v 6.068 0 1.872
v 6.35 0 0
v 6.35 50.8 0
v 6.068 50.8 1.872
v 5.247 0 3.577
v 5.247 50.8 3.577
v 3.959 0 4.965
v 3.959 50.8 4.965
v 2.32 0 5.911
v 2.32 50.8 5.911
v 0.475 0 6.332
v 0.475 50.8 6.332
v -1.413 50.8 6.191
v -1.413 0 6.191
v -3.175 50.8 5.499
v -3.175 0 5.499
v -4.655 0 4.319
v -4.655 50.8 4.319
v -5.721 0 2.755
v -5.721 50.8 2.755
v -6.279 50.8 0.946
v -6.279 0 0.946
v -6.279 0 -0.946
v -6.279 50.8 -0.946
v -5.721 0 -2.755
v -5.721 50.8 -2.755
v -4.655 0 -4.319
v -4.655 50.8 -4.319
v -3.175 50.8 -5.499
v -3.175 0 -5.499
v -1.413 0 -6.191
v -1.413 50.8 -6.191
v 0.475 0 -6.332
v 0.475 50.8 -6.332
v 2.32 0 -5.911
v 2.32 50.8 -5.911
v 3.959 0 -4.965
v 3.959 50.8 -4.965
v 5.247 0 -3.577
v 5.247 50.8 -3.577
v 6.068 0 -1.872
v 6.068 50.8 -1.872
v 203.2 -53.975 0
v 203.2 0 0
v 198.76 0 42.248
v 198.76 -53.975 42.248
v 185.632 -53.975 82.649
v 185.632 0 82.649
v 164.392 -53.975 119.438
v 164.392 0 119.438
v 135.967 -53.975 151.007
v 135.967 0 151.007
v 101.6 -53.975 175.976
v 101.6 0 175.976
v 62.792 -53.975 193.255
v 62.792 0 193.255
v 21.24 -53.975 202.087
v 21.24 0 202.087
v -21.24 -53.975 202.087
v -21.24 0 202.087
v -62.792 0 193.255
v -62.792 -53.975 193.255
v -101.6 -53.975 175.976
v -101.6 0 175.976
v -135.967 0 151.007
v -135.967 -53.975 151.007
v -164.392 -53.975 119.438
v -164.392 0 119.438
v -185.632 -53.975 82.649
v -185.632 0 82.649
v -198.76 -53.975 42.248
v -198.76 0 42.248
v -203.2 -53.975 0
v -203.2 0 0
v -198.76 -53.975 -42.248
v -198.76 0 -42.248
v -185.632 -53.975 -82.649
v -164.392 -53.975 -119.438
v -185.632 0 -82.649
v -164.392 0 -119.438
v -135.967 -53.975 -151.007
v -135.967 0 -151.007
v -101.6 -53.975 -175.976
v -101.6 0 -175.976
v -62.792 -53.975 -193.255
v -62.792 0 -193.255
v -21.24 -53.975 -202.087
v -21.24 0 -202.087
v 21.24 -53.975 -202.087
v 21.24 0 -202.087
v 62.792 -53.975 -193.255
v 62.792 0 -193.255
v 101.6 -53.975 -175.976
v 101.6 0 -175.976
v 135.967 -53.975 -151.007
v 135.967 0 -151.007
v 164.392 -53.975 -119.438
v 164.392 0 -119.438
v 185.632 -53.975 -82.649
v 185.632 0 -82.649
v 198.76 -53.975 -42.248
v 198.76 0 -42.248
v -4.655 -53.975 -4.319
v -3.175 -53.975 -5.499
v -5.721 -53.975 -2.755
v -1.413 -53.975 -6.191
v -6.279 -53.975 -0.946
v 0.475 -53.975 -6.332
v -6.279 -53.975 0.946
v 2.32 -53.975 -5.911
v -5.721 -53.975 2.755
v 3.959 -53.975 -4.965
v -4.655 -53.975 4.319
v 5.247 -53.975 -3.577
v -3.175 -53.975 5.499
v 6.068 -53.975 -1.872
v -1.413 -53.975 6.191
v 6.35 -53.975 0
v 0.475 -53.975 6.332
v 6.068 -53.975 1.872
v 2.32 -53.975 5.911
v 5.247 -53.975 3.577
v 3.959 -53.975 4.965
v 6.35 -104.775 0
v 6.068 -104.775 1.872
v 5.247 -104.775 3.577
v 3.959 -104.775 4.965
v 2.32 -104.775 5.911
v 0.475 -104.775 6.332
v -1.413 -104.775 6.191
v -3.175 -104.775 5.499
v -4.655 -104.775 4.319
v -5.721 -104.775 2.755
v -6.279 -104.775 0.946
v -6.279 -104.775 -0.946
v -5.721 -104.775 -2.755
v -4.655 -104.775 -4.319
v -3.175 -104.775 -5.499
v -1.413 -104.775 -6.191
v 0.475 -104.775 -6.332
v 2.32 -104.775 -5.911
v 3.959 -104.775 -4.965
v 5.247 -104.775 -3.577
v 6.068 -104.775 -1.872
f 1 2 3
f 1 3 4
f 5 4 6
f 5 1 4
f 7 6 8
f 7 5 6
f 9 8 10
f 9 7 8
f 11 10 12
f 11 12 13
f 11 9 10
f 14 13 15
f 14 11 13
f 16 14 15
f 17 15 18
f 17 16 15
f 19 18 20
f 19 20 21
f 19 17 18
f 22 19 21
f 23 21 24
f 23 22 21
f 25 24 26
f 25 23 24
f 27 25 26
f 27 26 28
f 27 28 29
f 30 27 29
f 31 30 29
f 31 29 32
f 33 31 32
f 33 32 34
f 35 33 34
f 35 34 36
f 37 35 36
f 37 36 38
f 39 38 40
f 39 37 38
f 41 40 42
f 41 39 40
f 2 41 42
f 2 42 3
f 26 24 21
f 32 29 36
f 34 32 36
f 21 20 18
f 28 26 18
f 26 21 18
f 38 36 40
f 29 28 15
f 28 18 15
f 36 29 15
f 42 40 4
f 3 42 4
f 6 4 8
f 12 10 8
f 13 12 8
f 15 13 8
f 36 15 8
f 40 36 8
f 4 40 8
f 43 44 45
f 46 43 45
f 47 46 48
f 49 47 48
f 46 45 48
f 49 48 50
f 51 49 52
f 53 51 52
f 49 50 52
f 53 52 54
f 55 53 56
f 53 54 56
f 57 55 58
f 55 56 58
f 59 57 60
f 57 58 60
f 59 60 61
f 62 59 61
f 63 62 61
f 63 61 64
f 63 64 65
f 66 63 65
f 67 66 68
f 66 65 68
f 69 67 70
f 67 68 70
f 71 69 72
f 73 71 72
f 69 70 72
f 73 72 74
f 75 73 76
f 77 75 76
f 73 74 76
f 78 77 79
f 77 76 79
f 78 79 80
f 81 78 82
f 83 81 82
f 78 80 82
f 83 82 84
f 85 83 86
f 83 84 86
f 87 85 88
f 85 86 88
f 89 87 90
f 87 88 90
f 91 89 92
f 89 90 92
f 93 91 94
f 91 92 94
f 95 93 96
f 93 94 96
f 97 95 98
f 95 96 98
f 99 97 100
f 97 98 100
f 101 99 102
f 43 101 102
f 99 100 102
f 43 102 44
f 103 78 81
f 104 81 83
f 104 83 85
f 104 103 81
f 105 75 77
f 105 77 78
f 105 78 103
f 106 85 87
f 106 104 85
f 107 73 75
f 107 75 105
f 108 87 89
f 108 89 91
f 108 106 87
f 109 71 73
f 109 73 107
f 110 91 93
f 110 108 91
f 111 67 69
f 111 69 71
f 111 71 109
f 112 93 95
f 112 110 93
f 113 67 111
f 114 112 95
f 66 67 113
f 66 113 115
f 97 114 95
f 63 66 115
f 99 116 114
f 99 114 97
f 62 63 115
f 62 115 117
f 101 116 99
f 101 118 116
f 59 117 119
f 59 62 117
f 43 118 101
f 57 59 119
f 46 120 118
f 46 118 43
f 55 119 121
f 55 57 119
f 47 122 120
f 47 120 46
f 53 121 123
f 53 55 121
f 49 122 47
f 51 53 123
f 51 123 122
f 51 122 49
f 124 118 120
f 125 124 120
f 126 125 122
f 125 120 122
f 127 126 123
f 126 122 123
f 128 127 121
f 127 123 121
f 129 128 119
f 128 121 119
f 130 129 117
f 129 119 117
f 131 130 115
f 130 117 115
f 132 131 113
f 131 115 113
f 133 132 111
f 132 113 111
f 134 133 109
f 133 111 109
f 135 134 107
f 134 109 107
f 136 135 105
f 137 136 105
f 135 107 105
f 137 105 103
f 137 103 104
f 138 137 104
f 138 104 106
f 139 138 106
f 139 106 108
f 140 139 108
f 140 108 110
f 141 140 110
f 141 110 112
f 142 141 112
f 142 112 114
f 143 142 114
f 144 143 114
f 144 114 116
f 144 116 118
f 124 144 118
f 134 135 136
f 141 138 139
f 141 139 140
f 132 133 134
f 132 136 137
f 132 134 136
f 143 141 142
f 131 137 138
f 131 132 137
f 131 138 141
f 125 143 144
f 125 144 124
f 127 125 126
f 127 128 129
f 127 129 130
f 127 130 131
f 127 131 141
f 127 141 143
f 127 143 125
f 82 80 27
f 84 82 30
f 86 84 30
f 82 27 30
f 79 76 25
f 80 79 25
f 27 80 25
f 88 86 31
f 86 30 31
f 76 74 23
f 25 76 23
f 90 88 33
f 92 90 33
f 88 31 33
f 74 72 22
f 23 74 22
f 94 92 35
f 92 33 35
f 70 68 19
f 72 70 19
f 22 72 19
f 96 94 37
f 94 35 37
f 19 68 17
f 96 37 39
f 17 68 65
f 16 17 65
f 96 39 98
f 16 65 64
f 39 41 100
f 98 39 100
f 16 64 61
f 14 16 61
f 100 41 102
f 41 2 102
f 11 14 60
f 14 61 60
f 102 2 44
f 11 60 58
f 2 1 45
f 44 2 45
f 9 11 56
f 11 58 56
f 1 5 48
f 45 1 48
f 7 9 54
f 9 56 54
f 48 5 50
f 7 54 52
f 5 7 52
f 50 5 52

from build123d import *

# Parameters (mm, degrees)
F0_R          = 6.35
F0_R_2        = 203.2
F1_DEPTH      = 53.975
F2_DEPTH      = 104.775
F2_DEPTH_BACK = 50.8


with BuildPart() as f1:
    # F0 (on Front) → F1 (new body)
    with BuildSketch(Plane.XZ):
        Circle(F0_R)
        Circle(F0_R_2)
        Circle(F0_R, mode=Mode.SUBTRACT)
    extrude(amount=F1_DEPTH)

    # F0 (on Front) → F2 (join, two sides)
    with BuildSketch(Plane.XZ) as f2_sk:
        Circle(F0_R)
    extrude(amount=F2_DEPTH)
    extrude(f2_sk.sketch, amount=-F2_DEPTH_BACK)


solid = f1.part
